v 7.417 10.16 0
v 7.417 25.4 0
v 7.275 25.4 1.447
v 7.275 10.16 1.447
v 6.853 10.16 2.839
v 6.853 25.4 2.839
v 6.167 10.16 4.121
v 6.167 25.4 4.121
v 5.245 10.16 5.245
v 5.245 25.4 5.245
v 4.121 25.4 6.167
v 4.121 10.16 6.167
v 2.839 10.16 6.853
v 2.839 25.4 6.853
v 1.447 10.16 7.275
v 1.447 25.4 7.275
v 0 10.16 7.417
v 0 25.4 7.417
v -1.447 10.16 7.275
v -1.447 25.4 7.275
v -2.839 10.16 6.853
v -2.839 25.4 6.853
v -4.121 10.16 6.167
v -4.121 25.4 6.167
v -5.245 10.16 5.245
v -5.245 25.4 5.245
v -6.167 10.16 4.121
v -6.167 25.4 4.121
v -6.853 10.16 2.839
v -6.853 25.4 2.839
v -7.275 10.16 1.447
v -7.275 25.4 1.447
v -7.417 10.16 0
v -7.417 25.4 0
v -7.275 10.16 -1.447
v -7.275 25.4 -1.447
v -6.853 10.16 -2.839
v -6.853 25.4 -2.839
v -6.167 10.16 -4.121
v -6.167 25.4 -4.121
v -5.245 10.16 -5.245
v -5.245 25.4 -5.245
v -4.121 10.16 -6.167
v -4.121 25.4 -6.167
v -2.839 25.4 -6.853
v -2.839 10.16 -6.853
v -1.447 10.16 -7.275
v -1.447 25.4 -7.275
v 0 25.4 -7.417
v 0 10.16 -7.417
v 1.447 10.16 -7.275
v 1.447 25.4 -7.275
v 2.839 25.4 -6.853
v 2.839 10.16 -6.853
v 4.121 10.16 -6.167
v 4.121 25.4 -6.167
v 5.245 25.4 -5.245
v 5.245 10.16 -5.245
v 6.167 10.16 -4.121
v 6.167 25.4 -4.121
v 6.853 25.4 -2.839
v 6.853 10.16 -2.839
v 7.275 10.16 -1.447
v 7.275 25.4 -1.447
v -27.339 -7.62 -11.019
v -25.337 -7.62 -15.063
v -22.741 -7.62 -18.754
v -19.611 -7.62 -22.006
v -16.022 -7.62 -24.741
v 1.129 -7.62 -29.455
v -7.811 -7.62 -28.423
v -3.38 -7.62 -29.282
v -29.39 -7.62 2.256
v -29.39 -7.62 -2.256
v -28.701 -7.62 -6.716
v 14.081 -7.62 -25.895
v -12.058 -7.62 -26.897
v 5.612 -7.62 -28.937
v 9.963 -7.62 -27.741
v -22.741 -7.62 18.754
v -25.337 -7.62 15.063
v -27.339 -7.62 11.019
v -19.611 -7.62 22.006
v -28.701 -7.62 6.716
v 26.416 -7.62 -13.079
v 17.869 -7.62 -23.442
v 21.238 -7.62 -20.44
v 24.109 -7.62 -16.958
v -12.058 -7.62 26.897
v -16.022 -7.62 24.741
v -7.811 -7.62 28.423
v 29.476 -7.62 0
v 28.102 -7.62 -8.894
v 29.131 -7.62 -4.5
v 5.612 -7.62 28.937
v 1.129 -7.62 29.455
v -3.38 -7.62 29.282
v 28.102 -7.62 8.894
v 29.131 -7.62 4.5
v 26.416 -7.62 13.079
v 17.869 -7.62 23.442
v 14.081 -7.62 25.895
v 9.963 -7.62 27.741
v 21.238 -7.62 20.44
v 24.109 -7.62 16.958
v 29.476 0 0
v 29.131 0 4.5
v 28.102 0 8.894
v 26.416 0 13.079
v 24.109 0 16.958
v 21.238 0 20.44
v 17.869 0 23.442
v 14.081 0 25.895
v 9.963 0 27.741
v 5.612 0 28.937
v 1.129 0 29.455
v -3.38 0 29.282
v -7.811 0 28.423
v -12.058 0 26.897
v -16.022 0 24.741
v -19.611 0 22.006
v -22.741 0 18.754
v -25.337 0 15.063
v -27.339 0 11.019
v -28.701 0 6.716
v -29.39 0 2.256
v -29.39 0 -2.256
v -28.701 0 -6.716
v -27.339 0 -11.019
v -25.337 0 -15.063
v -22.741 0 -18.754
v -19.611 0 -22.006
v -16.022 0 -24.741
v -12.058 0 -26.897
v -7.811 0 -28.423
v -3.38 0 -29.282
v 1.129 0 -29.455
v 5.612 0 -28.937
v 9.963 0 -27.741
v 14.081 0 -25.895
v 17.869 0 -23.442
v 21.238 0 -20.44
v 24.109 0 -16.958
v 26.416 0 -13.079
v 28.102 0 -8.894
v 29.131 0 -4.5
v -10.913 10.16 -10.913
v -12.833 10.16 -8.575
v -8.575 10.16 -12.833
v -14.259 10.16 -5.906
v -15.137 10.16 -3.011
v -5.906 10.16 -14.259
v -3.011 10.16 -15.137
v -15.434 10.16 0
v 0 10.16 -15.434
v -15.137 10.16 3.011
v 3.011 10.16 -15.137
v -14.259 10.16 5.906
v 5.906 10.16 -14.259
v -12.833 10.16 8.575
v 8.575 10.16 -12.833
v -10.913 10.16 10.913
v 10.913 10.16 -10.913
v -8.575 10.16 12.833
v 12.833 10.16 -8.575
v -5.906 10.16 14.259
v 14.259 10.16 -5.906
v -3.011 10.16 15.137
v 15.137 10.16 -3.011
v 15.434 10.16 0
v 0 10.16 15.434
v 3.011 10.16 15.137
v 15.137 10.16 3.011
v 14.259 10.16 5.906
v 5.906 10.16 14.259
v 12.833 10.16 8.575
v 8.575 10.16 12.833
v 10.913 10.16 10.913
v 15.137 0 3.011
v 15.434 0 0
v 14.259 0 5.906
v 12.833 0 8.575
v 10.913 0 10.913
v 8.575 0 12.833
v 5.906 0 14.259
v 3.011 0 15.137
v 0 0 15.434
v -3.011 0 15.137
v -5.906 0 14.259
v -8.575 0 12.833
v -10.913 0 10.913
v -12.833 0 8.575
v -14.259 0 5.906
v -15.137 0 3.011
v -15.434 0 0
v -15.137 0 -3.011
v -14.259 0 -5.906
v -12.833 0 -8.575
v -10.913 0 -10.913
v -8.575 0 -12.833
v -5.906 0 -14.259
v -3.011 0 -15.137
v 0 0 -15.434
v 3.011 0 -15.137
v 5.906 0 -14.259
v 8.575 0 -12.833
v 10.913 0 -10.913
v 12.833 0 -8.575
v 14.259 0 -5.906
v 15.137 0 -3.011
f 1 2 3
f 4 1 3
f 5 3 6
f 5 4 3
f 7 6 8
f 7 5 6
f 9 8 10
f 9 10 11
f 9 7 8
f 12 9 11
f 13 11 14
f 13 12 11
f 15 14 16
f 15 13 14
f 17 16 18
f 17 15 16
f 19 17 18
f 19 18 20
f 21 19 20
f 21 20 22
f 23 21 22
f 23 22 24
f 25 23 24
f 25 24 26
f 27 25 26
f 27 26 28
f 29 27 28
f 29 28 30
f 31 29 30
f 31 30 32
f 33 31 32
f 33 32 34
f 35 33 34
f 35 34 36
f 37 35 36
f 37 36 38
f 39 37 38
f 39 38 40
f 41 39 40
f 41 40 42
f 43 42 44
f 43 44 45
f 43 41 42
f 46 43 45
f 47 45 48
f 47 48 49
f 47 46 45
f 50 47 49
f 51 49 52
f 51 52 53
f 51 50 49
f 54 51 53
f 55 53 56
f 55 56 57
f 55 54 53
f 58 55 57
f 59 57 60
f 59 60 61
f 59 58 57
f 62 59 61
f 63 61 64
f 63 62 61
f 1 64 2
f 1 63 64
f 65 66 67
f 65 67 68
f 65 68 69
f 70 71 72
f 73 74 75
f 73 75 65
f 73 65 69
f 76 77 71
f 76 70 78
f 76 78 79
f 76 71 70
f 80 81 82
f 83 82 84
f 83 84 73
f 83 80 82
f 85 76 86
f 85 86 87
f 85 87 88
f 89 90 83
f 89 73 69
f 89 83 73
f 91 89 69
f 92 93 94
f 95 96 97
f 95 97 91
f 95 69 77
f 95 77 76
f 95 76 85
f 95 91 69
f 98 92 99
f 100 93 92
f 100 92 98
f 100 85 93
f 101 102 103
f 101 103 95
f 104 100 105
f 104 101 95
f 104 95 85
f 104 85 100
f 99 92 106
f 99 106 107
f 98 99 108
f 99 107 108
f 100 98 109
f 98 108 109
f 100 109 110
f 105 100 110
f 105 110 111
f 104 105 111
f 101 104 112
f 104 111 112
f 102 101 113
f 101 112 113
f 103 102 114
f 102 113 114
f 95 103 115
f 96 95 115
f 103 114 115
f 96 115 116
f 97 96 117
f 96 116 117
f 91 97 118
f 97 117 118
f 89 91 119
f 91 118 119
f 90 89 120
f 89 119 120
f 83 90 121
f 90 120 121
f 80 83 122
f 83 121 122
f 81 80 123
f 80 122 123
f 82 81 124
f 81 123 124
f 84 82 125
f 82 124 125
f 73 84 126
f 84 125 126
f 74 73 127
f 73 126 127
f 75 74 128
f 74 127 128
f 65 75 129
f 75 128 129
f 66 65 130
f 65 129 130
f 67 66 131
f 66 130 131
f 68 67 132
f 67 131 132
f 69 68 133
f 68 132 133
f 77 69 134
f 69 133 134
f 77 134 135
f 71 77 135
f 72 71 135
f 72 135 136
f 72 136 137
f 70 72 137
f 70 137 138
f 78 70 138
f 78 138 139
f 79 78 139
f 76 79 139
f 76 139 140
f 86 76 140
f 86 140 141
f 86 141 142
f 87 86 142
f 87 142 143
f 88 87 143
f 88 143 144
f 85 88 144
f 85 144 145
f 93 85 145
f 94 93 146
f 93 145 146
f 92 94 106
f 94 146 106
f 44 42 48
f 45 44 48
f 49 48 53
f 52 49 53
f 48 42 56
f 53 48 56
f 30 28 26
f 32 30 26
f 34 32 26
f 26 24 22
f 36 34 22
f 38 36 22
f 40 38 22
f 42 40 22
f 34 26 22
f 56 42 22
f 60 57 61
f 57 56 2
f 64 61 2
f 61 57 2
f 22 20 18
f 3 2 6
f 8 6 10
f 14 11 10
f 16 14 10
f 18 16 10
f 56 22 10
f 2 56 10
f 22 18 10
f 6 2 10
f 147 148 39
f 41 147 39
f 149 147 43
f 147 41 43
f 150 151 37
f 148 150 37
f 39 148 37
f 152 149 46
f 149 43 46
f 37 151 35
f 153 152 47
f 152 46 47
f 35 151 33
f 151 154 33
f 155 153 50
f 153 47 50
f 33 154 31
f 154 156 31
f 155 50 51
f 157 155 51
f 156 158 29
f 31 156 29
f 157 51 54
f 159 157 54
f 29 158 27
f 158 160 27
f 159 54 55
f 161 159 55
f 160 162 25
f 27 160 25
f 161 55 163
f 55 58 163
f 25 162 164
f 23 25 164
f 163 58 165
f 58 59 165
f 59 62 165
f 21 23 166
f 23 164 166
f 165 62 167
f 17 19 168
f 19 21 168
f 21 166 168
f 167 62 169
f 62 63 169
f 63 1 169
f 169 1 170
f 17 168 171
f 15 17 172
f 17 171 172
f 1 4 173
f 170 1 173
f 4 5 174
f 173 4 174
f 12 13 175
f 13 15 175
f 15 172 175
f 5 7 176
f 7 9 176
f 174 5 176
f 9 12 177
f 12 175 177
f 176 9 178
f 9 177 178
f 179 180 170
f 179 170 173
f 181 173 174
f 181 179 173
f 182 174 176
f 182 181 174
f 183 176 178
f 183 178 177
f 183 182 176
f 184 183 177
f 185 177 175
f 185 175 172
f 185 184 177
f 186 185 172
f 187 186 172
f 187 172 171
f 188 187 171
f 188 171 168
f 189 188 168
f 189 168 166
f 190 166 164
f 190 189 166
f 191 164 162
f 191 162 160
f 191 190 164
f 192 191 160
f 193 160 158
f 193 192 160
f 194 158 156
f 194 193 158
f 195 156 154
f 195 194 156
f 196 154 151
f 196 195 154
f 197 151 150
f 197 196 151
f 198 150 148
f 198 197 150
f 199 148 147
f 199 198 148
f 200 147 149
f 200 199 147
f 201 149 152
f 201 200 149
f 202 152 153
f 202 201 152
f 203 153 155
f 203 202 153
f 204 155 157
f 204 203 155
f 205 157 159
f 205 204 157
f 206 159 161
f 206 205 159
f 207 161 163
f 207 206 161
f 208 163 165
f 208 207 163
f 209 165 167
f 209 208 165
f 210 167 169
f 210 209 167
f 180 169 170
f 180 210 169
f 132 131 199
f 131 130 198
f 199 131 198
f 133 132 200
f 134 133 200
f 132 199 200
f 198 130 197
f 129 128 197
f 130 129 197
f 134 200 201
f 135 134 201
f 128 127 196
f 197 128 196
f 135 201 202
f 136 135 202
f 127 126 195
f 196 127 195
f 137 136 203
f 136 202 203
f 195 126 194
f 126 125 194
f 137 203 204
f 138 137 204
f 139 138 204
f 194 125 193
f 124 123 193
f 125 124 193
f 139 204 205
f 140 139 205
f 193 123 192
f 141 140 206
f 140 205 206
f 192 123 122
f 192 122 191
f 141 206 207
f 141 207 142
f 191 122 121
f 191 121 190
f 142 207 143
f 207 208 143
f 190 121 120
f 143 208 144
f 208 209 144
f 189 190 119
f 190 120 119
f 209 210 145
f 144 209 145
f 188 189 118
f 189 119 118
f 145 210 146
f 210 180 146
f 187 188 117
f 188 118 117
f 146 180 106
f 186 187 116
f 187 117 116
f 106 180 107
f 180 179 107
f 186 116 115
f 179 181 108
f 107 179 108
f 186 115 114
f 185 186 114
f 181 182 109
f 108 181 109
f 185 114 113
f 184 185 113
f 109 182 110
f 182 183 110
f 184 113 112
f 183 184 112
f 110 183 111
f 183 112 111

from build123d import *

# Parameters (mm, degrees)
F0_R     = 29.4761945826
F0_R_2   = 15.4337989403
F0_R_3   = 7.4174177389
F1_DEPTH = 7.62
F2_DEPTH = 10.16
F3_DEPTH = 25.4


with BuildPart() as f1:
    # F0 (on Front) → F1 (new body)
    with BuildSketch(Plane.XZ):
        Circle(F0_R)
        Circle(F0_R_2, mode=Mode.SUBTRACT)
        Circle(F0_R_2)
        Circle(F0_R_3, mode=Mode.SUBTRACT)
        Circle(F0_R_3)
    extrude(amount=F1_DEPTH)

    # F0 (on Front) → F2 (join)
    with BuildSketch(Plane.XZ):
        Circle(F0_R_2)
        Circle(F0_R_3, mode=Mode.SUBTRACT)
        Circle(F0_R_3)
    extrude(amount=-F2_DEPTH)

    # F0 (on Front) → F3 (join)
    with BuildSketch(Plane.XZ):
        Circle(F0_R_3)
    extrude(amount=-F3_DEPTH)


solid = f1.part
